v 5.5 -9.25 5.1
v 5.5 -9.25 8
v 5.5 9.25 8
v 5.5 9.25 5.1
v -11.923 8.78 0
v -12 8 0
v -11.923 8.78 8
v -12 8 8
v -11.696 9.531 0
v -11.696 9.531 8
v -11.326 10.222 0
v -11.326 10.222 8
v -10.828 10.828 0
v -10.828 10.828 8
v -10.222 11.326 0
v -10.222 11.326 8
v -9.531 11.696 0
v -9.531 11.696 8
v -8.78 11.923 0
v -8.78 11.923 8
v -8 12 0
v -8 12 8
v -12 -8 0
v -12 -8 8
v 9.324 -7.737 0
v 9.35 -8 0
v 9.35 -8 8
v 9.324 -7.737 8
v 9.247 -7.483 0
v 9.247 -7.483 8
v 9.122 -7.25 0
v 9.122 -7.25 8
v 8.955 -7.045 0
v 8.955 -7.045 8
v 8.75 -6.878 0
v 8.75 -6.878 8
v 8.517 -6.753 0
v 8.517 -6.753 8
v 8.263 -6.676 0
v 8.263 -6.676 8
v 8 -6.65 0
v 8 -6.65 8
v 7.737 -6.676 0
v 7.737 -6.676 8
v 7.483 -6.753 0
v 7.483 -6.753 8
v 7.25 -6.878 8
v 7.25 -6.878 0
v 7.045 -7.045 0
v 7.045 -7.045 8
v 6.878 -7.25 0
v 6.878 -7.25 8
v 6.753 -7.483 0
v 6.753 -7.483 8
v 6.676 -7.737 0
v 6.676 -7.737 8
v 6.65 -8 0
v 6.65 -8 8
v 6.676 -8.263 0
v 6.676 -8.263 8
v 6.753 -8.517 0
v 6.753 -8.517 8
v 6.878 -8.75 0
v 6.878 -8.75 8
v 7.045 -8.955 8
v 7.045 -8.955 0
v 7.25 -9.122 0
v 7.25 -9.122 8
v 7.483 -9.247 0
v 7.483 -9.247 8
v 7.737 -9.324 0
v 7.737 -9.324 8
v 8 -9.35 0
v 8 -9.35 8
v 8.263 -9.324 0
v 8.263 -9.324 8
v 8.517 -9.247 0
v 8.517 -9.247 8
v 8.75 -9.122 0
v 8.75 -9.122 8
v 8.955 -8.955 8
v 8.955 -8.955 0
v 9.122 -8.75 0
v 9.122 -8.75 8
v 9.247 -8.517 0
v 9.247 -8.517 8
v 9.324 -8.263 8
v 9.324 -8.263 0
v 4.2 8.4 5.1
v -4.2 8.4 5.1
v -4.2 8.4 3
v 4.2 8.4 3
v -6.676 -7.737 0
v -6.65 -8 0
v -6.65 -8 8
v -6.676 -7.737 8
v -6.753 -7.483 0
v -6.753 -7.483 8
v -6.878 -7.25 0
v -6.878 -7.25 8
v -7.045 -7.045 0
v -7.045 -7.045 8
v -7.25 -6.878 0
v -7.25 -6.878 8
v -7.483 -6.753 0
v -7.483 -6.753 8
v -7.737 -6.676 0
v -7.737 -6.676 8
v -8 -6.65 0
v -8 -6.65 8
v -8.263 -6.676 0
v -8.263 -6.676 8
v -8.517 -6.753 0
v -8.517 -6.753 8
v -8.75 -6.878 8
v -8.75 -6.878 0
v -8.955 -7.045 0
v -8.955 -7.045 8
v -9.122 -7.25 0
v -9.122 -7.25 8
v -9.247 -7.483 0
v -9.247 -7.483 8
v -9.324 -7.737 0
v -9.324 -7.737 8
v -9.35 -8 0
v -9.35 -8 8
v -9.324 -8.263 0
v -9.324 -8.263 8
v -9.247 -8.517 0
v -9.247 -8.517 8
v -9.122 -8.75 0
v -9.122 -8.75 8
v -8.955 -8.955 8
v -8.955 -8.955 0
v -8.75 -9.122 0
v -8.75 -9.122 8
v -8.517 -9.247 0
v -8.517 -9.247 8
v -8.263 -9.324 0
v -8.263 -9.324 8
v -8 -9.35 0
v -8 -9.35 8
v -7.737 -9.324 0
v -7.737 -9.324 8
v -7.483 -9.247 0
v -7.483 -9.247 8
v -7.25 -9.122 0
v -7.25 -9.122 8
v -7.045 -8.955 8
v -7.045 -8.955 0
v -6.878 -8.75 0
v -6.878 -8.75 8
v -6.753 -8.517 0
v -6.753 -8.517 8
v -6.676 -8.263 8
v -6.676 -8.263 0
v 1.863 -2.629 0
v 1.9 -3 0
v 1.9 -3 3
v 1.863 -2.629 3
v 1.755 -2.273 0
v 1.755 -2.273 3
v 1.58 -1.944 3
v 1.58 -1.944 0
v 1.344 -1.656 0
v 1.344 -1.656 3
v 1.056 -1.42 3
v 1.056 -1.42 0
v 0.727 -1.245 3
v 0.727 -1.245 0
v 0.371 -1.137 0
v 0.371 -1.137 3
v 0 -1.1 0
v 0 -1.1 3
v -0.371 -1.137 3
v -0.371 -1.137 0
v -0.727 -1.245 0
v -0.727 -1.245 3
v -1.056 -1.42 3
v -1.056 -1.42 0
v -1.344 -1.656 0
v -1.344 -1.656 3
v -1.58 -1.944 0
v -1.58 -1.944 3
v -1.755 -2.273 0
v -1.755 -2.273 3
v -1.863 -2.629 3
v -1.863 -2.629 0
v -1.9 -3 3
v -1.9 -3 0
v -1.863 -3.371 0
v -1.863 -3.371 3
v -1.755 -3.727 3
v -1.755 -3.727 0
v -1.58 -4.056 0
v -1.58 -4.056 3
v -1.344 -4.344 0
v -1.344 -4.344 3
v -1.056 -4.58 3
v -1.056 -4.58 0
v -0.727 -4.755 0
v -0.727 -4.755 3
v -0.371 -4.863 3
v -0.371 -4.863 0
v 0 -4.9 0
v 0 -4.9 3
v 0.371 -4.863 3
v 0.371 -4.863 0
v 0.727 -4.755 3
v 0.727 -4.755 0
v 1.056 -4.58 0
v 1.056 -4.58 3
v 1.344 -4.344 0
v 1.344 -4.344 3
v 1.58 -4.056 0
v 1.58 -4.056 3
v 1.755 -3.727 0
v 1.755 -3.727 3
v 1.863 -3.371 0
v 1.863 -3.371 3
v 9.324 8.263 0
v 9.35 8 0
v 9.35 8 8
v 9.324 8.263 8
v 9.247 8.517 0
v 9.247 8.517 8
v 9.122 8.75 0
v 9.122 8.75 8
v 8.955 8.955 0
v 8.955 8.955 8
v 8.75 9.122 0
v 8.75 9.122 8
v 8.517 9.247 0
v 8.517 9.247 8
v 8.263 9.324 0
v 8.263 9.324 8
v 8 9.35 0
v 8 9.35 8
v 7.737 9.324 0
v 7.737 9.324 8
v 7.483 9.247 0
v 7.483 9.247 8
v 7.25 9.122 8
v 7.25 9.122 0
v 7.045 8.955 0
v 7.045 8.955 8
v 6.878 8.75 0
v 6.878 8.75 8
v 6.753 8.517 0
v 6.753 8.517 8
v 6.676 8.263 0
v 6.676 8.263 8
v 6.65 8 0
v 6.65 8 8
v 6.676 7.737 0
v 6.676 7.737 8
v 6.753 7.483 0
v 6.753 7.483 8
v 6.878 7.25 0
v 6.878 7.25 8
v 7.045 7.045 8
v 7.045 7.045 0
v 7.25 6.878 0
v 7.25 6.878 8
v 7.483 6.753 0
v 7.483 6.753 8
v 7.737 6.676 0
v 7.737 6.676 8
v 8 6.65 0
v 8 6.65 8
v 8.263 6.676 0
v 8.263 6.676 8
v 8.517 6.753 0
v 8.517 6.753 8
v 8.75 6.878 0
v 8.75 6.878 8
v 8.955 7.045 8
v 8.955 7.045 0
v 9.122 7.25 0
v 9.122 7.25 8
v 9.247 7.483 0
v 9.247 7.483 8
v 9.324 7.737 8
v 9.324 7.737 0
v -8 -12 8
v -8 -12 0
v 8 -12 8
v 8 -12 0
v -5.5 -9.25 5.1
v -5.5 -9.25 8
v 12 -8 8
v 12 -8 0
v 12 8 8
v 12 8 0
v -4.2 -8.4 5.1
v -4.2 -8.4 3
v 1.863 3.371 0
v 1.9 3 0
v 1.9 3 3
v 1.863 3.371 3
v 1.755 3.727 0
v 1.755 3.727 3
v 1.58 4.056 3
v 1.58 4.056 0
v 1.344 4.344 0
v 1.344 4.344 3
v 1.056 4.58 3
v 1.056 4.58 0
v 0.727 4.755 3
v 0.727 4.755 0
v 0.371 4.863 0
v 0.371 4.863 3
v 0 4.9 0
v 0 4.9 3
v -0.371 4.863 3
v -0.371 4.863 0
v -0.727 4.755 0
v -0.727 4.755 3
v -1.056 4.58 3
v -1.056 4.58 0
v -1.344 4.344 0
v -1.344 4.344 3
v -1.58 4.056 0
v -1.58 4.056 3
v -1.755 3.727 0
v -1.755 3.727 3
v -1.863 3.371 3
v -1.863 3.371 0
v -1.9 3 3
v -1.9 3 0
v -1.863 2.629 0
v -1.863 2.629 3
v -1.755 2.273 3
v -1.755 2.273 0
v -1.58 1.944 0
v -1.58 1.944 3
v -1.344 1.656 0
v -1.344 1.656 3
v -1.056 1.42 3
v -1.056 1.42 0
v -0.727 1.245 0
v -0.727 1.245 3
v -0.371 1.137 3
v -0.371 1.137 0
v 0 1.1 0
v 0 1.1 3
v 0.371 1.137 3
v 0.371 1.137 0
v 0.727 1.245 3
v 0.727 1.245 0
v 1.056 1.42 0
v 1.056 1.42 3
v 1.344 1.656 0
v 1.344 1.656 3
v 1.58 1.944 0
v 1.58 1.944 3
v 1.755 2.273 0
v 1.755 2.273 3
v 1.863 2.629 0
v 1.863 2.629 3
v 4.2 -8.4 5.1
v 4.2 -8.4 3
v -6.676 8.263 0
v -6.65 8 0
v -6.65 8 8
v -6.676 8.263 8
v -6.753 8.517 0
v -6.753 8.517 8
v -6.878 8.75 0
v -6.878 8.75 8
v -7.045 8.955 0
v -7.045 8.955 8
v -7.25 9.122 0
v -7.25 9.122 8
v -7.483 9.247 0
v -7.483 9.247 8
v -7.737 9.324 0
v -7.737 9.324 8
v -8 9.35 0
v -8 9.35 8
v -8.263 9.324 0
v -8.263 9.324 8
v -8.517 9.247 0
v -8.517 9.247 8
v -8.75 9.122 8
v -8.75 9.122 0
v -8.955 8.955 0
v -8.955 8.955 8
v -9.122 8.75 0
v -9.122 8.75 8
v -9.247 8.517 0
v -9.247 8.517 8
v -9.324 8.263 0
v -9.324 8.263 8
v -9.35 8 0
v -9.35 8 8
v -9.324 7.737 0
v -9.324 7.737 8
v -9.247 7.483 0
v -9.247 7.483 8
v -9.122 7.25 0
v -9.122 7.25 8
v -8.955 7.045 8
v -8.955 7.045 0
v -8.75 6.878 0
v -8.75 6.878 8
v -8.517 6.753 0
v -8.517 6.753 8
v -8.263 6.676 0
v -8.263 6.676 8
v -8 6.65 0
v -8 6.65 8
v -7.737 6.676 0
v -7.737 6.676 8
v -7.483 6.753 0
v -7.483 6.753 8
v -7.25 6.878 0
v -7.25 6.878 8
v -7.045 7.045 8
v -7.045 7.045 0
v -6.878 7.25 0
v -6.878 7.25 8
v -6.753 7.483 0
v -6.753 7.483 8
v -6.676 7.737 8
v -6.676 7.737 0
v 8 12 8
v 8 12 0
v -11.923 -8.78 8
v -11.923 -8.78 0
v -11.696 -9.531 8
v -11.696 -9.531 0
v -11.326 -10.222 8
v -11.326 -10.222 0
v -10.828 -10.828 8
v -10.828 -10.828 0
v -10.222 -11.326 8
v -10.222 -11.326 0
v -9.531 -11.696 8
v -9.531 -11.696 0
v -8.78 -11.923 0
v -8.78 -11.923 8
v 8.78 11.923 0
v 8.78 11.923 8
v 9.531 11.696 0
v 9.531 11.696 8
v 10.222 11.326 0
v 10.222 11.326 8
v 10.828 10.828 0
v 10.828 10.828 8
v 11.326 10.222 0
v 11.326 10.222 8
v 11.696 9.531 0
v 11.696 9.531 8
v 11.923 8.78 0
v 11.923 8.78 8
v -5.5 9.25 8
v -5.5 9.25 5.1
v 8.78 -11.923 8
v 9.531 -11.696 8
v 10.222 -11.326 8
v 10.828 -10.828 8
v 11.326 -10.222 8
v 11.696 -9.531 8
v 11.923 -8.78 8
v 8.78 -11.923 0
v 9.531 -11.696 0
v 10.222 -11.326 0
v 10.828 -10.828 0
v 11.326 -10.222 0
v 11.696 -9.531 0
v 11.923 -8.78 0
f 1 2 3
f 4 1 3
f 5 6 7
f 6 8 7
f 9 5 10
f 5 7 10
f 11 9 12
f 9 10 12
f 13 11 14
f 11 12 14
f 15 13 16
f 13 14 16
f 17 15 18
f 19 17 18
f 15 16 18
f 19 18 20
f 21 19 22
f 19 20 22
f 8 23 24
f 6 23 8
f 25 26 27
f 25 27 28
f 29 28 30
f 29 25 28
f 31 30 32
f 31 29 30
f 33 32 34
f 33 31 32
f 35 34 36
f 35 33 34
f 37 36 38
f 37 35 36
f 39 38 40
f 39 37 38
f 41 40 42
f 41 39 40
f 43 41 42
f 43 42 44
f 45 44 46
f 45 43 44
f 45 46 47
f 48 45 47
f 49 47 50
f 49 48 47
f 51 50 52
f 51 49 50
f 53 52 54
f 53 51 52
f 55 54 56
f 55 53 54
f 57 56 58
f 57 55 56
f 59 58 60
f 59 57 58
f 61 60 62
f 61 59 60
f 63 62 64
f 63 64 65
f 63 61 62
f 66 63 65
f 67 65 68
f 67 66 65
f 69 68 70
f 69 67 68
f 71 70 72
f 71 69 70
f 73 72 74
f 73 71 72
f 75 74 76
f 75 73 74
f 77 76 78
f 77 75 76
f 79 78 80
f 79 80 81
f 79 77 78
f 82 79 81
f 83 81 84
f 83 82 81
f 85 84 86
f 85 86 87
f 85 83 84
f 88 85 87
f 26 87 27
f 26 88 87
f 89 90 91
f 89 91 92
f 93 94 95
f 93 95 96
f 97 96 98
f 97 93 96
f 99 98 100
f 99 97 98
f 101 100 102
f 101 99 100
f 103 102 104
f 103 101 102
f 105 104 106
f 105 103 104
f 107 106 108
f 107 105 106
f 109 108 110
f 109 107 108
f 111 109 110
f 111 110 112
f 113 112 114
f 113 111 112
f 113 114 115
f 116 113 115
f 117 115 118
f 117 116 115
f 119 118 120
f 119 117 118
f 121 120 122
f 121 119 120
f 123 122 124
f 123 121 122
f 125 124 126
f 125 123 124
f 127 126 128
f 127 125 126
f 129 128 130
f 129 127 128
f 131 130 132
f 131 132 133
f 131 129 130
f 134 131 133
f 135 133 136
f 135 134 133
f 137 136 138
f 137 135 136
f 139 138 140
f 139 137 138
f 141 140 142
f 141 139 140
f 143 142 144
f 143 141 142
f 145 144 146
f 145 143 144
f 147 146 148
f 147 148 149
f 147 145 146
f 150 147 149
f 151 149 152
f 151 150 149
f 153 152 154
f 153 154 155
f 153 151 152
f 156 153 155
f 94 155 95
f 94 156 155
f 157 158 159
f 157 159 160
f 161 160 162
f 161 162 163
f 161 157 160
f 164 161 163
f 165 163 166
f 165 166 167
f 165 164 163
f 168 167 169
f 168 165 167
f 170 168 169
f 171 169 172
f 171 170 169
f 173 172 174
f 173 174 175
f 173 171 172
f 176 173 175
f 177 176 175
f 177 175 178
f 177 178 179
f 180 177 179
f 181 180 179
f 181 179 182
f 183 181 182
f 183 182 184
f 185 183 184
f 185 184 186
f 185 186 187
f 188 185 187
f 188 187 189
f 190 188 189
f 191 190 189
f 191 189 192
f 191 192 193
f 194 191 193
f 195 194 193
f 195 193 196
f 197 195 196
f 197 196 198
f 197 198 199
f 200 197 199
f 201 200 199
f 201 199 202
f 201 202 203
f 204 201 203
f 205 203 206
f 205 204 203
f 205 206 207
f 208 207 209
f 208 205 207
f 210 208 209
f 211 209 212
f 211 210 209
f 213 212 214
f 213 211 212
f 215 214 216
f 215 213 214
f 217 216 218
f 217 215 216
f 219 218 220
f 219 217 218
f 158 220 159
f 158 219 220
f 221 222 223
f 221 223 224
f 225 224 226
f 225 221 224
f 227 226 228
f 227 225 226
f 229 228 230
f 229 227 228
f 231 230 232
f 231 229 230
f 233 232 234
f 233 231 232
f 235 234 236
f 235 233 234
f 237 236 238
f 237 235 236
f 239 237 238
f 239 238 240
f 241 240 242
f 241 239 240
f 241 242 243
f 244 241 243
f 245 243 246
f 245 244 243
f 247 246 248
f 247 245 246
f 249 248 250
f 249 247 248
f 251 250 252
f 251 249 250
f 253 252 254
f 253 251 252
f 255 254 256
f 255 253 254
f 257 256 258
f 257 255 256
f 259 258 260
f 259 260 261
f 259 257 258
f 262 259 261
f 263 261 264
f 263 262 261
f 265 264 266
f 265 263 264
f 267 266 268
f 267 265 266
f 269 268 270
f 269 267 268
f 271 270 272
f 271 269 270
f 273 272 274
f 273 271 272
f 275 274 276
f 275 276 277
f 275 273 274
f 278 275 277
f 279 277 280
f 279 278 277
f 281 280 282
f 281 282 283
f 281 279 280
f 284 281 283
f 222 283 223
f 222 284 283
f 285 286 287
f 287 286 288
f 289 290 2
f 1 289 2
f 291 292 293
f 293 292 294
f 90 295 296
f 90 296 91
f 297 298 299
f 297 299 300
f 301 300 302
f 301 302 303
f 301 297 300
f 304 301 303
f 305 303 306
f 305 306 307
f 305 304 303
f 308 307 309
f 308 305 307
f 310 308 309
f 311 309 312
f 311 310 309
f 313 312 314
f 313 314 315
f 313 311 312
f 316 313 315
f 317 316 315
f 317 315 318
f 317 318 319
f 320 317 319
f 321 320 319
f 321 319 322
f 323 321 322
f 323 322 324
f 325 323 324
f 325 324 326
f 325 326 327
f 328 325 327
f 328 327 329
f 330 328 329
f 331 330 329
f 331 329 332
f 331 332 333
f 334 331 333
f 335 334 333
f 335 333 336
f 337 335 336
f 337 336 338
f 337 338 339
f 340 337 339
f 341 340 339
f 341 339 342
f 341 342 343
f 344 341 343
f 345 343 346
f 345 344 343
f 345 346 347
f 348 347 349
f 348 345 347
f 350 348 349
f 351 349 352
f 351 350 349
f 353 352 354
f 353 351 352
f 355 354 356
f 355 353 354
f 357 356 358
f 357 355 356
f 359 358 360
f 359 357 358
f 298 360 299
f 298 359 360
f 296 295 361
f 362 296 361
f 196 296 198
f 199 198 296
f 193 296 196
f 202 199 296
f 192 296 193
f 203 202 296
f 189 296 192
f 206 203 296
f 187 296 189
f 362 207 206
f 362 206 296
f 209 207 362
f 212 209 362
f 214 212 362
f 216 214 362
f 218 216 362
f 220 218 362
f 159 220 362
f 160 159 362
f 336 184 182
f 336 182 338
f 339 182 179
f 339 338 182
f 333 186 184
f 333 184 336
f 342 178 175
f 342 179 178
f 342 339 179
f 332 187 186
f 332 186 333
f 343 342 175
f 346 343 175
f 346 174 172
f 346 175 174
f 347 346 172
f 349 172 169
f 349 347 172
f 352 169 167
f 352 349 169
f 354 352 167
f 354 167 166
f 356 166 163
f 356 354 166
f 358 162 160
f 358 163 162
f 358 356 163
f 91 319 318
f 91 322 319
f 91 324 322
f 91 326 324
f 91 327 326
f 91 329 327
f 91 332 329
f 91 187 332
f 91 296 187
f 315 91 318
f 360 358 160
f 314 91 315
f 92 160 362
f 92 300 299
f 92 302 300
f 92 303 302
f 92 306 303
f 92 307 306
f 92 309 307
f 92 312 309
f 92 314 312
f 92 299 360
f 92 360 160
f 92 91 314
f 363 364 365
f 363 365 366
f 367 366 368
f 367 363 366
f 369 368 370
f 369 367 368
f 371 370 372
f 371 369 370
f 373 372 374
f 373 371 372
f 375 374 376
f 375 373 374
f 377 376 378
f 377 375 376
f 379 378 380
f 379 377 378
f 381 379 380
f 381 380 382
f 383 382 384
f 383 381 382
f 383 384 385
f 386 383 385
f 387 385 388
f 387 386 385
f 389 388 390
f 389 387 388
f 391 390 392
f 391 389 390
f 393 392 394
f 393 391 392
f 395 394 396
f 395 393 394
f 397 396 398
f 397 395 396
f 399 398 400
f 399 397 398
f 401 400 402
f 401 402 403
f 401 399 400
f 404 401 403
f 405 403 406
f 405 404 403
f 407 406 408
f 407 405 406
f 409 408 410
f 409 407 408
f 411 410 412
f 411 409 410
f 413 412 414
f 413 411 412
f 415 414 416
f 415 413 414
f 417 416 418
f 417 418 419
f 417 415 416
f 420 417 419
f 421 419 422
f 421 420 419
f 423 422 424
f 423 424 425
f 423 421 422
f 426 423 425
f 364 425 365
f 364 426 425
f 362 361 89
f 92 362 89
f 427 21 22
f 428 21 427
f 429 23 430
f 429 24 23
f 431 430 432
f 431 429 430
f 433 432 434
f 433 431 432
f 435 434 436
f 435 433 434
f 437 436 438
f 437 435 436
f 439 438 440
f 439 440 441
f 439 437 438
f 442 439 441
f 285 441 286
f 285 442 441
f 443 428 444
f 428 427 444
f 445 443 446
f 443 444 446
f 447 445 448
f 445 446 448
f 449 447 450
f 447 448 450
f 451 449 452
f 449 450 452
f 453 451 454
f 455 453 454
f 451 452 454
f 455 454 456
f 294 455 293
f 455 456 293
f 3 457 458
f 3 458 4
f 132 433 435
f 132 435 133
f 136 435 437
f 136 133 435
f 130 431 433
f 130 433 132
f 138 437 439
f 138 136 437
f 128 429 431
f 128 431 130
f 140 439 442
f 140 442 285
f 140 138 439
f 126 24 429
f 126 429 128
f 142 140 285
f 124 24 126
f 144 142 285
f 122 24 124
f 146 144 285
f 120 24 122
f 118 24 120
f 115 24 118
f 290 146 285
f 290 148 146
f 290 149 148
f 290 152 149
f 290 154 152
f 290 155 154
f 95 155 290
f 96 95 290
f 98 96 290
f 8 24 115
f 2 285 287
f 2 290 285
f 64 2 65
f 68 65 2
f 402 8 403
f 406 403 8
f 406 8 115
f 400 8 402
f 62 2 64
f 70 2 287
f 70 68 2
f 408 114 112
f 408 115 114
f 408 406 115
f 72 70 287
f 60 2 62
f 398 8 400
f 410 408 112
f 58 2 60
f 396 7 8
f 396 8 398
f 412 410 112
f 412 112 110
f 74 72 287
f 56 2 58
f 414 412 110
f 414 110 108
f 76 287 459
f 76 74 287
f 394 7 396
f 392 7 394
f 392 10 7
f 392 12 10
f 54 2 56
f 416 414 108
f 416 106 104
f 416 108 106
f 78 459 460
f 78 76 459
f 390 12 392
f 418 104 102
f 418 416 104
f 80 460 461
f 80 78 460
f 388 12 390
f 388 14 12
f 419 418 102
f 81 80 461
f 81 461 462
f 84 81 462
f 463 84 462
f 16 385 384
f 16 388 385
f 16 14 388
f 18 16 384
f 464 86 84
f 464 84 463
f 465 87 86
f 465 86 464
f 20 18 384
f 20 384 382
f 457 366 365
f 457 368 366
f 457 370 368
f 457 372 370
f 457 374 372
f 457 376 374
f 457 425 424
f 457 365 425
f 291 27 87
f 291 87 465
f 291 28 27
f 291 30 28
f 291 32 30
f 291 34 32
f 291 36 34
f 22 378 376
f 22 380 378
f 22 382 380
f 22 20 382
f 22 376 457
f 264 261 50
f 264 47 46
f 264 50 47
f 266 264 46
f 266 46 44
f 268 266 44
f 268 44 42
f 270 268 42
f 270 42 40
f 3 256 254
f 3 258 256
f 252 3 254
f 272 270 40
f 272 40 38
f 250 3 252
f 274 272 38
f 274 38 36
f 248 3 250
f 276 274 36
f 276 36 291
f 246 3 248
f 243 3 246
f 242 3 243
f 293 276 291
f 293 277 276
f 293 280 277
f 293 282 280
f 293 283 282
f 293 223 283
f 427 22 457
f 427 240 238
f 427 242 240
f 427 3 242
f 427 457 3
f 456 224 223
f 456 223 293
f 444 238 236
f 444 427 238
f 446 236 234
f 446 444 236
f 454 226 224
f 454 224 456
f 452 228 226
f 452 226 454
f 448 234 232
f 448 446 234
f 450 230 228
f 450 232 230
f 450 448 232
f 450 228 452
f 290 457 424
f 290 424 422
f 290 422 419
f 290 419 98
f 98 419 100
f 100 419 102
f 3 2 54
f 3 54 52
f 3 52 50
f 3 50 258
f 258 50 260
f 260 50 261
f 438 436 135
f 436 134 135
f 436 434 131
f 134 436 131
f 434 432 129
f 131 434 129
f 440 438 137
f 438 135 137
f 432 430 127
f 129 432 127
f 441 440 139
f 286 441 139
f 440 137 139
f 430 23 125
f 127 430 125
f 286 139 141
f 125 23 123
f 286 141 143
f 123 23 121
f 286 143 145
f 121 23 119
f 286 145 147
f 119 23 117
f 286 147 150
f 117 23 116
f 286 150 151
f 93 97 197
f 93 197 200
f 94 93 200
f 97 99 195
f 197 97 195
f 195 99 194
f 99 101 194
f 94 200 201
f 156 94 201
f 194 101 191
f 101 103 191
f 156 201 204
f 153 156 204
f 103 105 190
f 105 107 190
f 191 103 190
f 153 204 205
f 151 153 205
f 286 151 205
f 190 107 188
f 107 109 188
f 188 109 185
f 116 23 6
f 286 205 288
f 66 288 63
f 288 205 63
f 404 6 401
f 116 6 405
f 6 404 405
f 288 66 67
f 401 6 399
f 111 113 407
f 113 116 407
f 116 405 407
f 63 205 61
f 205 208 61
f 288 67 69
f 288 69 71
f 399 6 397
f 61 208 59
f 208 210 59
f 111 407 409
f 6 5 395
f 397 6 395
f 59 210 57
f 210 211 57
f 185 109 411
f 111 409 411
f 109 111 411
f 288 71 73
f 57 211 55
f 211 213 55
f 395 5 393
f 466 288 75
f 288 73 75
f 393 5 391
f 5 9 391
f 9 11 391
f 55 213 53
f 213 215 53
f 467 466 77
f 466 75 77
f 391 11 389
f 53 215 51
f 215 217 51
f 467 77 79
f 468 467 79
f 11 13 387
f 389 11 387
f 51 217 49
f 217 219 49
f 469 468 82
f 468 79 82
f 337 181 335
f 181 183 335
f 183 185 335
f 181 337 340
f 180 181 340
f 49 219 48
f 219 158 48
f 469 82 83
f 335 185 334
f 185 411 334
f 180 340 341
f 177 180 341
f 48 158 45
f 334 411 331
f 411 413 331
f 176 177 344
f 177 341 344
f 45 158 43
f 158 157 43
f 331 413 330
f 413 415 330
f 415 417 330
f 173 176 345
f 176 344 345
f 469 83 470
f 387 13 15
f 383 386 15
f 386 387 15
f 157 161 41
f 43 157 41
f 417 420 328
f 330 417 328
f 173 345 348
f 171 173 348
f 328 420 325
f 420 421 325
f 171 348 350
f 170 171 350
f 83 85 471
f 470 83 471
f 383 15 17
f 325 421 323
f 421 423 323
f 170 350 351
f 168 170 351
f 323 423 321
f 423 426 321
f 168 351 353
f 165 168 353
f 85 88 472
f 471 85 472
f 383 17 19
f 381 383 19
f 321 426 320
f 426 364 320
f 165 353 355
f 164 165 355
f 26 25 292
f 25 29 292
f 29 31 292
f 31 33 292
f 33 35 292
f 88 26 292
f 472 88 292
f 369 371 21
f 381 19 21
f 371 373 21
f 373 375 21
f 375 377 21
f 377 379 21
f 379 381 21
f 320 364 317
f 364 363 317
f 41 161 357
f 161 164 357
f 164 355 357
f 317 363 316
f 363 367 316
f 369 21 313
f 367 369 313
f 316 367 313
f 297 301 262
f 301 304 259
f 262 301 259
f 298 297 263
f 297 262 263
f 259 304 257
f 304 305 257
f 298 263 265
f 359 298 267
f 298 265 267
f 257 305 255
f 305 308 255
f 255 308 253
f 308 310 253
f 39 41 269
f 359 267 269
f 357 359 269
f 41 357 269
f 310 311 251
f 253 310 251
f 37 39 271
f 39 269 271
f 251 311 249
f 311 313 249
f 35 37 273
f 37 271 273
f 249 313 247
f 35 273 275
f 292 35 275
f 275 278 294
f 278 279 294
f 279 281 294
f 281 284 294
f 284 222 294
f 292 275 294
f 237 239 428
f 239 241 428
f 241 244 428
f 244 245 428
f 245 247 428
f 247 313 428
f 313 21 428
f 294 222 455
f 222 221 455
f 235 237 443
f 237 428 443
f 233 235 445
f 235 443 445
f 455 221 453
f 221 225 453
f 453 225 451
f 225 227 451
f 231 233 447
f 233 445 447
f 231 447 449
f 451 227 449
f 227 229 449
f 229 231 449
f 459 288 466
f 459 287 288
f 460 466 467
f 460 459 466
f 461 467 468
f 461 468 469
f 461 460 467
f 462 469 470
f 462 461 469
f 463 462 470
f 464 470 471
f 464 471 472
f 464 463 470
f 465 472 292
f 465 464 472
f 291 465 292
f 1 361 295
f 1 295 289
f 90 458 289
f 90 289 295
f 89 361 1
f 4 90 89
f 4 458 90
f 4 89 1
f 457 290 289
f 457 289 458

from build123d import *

# Parameters (mm, degrees)
F0_W     = 24
F0_H     = 24
F0_R     = 1.35
F0_R_2   = 1.9
F1_DEPTH = 8
F2_W     = 8.4
F2_H     = 16.8
F2_R     = 1.9
F3_DEPTH = 5
F2_W_2   = 11
F2_H_2   = 18.5
F4_DEPTH = 2.9
F5_R     = 4


with BuildPart() as f1:
    # F0 (on Top) → F1 (new body)
    with BuildSketch(Plane.XY):
        Rectangle(F0_W, F0_H)
        with Locations((-8, -8)):
            Circle(F0_R, mode=Mode.SUBTRACT)
        with Locations((8, -8)):
            Circle(F0_R, mode=Mode.SUBTRACT)
        with Locations((0, -3)):
            Circle(F0_R_2, mode=Mode.SUBTRACT)
        with Locations((-8, 8)):
            Circle(F0_R, mode=Mode.SUBTRACT)
        with Locations((0, 3)):
            Circle(F0_R_2, mode=Mode.SUBTRACT)
        with Locations((8, 8)):
            Circle(F0_R, mode=Mode.SUBTRACT)
    extrude(amount=F1_DEPTH)

    # F2 (on face) → F3 (cut)
    with BuildSketch(Plane.XY.offset(8)):
        Rectangle(F2_W, F2_H)
        with Locations((0, -3)):
            Circle(F2_R, mode=Mode.SUBTRACT)
        with Locations((0, 3)):
            Circle(F2_R, mode=Mode.SUBTRACT)
    extrude(amount=-F3_DEPTH, mode=Mode.SUBTRACT)

    # F2 (on face) → F4 (cut)
    with BuildSketch(Plane.XY.offset(8)):
        Rectangle(F2_W_2, F2_H_2)
        Rectangle(F2_W, F2_H, mode=Mode.SUBTRACT)
    extrude(amount=-F4_DEPTH, mode=Mode.SUBTRACT)

    # F5
    f5_edges = [f1.edges().sort_by_distance(p)[0] for p in [
        (-12, 12, 4),
        (12, 12, 4),
        (12, -12, 4),
        (-12, -12, 4),
    ]]
    fillet(f5_edges, radius=F5_R)


solid = f1.part
